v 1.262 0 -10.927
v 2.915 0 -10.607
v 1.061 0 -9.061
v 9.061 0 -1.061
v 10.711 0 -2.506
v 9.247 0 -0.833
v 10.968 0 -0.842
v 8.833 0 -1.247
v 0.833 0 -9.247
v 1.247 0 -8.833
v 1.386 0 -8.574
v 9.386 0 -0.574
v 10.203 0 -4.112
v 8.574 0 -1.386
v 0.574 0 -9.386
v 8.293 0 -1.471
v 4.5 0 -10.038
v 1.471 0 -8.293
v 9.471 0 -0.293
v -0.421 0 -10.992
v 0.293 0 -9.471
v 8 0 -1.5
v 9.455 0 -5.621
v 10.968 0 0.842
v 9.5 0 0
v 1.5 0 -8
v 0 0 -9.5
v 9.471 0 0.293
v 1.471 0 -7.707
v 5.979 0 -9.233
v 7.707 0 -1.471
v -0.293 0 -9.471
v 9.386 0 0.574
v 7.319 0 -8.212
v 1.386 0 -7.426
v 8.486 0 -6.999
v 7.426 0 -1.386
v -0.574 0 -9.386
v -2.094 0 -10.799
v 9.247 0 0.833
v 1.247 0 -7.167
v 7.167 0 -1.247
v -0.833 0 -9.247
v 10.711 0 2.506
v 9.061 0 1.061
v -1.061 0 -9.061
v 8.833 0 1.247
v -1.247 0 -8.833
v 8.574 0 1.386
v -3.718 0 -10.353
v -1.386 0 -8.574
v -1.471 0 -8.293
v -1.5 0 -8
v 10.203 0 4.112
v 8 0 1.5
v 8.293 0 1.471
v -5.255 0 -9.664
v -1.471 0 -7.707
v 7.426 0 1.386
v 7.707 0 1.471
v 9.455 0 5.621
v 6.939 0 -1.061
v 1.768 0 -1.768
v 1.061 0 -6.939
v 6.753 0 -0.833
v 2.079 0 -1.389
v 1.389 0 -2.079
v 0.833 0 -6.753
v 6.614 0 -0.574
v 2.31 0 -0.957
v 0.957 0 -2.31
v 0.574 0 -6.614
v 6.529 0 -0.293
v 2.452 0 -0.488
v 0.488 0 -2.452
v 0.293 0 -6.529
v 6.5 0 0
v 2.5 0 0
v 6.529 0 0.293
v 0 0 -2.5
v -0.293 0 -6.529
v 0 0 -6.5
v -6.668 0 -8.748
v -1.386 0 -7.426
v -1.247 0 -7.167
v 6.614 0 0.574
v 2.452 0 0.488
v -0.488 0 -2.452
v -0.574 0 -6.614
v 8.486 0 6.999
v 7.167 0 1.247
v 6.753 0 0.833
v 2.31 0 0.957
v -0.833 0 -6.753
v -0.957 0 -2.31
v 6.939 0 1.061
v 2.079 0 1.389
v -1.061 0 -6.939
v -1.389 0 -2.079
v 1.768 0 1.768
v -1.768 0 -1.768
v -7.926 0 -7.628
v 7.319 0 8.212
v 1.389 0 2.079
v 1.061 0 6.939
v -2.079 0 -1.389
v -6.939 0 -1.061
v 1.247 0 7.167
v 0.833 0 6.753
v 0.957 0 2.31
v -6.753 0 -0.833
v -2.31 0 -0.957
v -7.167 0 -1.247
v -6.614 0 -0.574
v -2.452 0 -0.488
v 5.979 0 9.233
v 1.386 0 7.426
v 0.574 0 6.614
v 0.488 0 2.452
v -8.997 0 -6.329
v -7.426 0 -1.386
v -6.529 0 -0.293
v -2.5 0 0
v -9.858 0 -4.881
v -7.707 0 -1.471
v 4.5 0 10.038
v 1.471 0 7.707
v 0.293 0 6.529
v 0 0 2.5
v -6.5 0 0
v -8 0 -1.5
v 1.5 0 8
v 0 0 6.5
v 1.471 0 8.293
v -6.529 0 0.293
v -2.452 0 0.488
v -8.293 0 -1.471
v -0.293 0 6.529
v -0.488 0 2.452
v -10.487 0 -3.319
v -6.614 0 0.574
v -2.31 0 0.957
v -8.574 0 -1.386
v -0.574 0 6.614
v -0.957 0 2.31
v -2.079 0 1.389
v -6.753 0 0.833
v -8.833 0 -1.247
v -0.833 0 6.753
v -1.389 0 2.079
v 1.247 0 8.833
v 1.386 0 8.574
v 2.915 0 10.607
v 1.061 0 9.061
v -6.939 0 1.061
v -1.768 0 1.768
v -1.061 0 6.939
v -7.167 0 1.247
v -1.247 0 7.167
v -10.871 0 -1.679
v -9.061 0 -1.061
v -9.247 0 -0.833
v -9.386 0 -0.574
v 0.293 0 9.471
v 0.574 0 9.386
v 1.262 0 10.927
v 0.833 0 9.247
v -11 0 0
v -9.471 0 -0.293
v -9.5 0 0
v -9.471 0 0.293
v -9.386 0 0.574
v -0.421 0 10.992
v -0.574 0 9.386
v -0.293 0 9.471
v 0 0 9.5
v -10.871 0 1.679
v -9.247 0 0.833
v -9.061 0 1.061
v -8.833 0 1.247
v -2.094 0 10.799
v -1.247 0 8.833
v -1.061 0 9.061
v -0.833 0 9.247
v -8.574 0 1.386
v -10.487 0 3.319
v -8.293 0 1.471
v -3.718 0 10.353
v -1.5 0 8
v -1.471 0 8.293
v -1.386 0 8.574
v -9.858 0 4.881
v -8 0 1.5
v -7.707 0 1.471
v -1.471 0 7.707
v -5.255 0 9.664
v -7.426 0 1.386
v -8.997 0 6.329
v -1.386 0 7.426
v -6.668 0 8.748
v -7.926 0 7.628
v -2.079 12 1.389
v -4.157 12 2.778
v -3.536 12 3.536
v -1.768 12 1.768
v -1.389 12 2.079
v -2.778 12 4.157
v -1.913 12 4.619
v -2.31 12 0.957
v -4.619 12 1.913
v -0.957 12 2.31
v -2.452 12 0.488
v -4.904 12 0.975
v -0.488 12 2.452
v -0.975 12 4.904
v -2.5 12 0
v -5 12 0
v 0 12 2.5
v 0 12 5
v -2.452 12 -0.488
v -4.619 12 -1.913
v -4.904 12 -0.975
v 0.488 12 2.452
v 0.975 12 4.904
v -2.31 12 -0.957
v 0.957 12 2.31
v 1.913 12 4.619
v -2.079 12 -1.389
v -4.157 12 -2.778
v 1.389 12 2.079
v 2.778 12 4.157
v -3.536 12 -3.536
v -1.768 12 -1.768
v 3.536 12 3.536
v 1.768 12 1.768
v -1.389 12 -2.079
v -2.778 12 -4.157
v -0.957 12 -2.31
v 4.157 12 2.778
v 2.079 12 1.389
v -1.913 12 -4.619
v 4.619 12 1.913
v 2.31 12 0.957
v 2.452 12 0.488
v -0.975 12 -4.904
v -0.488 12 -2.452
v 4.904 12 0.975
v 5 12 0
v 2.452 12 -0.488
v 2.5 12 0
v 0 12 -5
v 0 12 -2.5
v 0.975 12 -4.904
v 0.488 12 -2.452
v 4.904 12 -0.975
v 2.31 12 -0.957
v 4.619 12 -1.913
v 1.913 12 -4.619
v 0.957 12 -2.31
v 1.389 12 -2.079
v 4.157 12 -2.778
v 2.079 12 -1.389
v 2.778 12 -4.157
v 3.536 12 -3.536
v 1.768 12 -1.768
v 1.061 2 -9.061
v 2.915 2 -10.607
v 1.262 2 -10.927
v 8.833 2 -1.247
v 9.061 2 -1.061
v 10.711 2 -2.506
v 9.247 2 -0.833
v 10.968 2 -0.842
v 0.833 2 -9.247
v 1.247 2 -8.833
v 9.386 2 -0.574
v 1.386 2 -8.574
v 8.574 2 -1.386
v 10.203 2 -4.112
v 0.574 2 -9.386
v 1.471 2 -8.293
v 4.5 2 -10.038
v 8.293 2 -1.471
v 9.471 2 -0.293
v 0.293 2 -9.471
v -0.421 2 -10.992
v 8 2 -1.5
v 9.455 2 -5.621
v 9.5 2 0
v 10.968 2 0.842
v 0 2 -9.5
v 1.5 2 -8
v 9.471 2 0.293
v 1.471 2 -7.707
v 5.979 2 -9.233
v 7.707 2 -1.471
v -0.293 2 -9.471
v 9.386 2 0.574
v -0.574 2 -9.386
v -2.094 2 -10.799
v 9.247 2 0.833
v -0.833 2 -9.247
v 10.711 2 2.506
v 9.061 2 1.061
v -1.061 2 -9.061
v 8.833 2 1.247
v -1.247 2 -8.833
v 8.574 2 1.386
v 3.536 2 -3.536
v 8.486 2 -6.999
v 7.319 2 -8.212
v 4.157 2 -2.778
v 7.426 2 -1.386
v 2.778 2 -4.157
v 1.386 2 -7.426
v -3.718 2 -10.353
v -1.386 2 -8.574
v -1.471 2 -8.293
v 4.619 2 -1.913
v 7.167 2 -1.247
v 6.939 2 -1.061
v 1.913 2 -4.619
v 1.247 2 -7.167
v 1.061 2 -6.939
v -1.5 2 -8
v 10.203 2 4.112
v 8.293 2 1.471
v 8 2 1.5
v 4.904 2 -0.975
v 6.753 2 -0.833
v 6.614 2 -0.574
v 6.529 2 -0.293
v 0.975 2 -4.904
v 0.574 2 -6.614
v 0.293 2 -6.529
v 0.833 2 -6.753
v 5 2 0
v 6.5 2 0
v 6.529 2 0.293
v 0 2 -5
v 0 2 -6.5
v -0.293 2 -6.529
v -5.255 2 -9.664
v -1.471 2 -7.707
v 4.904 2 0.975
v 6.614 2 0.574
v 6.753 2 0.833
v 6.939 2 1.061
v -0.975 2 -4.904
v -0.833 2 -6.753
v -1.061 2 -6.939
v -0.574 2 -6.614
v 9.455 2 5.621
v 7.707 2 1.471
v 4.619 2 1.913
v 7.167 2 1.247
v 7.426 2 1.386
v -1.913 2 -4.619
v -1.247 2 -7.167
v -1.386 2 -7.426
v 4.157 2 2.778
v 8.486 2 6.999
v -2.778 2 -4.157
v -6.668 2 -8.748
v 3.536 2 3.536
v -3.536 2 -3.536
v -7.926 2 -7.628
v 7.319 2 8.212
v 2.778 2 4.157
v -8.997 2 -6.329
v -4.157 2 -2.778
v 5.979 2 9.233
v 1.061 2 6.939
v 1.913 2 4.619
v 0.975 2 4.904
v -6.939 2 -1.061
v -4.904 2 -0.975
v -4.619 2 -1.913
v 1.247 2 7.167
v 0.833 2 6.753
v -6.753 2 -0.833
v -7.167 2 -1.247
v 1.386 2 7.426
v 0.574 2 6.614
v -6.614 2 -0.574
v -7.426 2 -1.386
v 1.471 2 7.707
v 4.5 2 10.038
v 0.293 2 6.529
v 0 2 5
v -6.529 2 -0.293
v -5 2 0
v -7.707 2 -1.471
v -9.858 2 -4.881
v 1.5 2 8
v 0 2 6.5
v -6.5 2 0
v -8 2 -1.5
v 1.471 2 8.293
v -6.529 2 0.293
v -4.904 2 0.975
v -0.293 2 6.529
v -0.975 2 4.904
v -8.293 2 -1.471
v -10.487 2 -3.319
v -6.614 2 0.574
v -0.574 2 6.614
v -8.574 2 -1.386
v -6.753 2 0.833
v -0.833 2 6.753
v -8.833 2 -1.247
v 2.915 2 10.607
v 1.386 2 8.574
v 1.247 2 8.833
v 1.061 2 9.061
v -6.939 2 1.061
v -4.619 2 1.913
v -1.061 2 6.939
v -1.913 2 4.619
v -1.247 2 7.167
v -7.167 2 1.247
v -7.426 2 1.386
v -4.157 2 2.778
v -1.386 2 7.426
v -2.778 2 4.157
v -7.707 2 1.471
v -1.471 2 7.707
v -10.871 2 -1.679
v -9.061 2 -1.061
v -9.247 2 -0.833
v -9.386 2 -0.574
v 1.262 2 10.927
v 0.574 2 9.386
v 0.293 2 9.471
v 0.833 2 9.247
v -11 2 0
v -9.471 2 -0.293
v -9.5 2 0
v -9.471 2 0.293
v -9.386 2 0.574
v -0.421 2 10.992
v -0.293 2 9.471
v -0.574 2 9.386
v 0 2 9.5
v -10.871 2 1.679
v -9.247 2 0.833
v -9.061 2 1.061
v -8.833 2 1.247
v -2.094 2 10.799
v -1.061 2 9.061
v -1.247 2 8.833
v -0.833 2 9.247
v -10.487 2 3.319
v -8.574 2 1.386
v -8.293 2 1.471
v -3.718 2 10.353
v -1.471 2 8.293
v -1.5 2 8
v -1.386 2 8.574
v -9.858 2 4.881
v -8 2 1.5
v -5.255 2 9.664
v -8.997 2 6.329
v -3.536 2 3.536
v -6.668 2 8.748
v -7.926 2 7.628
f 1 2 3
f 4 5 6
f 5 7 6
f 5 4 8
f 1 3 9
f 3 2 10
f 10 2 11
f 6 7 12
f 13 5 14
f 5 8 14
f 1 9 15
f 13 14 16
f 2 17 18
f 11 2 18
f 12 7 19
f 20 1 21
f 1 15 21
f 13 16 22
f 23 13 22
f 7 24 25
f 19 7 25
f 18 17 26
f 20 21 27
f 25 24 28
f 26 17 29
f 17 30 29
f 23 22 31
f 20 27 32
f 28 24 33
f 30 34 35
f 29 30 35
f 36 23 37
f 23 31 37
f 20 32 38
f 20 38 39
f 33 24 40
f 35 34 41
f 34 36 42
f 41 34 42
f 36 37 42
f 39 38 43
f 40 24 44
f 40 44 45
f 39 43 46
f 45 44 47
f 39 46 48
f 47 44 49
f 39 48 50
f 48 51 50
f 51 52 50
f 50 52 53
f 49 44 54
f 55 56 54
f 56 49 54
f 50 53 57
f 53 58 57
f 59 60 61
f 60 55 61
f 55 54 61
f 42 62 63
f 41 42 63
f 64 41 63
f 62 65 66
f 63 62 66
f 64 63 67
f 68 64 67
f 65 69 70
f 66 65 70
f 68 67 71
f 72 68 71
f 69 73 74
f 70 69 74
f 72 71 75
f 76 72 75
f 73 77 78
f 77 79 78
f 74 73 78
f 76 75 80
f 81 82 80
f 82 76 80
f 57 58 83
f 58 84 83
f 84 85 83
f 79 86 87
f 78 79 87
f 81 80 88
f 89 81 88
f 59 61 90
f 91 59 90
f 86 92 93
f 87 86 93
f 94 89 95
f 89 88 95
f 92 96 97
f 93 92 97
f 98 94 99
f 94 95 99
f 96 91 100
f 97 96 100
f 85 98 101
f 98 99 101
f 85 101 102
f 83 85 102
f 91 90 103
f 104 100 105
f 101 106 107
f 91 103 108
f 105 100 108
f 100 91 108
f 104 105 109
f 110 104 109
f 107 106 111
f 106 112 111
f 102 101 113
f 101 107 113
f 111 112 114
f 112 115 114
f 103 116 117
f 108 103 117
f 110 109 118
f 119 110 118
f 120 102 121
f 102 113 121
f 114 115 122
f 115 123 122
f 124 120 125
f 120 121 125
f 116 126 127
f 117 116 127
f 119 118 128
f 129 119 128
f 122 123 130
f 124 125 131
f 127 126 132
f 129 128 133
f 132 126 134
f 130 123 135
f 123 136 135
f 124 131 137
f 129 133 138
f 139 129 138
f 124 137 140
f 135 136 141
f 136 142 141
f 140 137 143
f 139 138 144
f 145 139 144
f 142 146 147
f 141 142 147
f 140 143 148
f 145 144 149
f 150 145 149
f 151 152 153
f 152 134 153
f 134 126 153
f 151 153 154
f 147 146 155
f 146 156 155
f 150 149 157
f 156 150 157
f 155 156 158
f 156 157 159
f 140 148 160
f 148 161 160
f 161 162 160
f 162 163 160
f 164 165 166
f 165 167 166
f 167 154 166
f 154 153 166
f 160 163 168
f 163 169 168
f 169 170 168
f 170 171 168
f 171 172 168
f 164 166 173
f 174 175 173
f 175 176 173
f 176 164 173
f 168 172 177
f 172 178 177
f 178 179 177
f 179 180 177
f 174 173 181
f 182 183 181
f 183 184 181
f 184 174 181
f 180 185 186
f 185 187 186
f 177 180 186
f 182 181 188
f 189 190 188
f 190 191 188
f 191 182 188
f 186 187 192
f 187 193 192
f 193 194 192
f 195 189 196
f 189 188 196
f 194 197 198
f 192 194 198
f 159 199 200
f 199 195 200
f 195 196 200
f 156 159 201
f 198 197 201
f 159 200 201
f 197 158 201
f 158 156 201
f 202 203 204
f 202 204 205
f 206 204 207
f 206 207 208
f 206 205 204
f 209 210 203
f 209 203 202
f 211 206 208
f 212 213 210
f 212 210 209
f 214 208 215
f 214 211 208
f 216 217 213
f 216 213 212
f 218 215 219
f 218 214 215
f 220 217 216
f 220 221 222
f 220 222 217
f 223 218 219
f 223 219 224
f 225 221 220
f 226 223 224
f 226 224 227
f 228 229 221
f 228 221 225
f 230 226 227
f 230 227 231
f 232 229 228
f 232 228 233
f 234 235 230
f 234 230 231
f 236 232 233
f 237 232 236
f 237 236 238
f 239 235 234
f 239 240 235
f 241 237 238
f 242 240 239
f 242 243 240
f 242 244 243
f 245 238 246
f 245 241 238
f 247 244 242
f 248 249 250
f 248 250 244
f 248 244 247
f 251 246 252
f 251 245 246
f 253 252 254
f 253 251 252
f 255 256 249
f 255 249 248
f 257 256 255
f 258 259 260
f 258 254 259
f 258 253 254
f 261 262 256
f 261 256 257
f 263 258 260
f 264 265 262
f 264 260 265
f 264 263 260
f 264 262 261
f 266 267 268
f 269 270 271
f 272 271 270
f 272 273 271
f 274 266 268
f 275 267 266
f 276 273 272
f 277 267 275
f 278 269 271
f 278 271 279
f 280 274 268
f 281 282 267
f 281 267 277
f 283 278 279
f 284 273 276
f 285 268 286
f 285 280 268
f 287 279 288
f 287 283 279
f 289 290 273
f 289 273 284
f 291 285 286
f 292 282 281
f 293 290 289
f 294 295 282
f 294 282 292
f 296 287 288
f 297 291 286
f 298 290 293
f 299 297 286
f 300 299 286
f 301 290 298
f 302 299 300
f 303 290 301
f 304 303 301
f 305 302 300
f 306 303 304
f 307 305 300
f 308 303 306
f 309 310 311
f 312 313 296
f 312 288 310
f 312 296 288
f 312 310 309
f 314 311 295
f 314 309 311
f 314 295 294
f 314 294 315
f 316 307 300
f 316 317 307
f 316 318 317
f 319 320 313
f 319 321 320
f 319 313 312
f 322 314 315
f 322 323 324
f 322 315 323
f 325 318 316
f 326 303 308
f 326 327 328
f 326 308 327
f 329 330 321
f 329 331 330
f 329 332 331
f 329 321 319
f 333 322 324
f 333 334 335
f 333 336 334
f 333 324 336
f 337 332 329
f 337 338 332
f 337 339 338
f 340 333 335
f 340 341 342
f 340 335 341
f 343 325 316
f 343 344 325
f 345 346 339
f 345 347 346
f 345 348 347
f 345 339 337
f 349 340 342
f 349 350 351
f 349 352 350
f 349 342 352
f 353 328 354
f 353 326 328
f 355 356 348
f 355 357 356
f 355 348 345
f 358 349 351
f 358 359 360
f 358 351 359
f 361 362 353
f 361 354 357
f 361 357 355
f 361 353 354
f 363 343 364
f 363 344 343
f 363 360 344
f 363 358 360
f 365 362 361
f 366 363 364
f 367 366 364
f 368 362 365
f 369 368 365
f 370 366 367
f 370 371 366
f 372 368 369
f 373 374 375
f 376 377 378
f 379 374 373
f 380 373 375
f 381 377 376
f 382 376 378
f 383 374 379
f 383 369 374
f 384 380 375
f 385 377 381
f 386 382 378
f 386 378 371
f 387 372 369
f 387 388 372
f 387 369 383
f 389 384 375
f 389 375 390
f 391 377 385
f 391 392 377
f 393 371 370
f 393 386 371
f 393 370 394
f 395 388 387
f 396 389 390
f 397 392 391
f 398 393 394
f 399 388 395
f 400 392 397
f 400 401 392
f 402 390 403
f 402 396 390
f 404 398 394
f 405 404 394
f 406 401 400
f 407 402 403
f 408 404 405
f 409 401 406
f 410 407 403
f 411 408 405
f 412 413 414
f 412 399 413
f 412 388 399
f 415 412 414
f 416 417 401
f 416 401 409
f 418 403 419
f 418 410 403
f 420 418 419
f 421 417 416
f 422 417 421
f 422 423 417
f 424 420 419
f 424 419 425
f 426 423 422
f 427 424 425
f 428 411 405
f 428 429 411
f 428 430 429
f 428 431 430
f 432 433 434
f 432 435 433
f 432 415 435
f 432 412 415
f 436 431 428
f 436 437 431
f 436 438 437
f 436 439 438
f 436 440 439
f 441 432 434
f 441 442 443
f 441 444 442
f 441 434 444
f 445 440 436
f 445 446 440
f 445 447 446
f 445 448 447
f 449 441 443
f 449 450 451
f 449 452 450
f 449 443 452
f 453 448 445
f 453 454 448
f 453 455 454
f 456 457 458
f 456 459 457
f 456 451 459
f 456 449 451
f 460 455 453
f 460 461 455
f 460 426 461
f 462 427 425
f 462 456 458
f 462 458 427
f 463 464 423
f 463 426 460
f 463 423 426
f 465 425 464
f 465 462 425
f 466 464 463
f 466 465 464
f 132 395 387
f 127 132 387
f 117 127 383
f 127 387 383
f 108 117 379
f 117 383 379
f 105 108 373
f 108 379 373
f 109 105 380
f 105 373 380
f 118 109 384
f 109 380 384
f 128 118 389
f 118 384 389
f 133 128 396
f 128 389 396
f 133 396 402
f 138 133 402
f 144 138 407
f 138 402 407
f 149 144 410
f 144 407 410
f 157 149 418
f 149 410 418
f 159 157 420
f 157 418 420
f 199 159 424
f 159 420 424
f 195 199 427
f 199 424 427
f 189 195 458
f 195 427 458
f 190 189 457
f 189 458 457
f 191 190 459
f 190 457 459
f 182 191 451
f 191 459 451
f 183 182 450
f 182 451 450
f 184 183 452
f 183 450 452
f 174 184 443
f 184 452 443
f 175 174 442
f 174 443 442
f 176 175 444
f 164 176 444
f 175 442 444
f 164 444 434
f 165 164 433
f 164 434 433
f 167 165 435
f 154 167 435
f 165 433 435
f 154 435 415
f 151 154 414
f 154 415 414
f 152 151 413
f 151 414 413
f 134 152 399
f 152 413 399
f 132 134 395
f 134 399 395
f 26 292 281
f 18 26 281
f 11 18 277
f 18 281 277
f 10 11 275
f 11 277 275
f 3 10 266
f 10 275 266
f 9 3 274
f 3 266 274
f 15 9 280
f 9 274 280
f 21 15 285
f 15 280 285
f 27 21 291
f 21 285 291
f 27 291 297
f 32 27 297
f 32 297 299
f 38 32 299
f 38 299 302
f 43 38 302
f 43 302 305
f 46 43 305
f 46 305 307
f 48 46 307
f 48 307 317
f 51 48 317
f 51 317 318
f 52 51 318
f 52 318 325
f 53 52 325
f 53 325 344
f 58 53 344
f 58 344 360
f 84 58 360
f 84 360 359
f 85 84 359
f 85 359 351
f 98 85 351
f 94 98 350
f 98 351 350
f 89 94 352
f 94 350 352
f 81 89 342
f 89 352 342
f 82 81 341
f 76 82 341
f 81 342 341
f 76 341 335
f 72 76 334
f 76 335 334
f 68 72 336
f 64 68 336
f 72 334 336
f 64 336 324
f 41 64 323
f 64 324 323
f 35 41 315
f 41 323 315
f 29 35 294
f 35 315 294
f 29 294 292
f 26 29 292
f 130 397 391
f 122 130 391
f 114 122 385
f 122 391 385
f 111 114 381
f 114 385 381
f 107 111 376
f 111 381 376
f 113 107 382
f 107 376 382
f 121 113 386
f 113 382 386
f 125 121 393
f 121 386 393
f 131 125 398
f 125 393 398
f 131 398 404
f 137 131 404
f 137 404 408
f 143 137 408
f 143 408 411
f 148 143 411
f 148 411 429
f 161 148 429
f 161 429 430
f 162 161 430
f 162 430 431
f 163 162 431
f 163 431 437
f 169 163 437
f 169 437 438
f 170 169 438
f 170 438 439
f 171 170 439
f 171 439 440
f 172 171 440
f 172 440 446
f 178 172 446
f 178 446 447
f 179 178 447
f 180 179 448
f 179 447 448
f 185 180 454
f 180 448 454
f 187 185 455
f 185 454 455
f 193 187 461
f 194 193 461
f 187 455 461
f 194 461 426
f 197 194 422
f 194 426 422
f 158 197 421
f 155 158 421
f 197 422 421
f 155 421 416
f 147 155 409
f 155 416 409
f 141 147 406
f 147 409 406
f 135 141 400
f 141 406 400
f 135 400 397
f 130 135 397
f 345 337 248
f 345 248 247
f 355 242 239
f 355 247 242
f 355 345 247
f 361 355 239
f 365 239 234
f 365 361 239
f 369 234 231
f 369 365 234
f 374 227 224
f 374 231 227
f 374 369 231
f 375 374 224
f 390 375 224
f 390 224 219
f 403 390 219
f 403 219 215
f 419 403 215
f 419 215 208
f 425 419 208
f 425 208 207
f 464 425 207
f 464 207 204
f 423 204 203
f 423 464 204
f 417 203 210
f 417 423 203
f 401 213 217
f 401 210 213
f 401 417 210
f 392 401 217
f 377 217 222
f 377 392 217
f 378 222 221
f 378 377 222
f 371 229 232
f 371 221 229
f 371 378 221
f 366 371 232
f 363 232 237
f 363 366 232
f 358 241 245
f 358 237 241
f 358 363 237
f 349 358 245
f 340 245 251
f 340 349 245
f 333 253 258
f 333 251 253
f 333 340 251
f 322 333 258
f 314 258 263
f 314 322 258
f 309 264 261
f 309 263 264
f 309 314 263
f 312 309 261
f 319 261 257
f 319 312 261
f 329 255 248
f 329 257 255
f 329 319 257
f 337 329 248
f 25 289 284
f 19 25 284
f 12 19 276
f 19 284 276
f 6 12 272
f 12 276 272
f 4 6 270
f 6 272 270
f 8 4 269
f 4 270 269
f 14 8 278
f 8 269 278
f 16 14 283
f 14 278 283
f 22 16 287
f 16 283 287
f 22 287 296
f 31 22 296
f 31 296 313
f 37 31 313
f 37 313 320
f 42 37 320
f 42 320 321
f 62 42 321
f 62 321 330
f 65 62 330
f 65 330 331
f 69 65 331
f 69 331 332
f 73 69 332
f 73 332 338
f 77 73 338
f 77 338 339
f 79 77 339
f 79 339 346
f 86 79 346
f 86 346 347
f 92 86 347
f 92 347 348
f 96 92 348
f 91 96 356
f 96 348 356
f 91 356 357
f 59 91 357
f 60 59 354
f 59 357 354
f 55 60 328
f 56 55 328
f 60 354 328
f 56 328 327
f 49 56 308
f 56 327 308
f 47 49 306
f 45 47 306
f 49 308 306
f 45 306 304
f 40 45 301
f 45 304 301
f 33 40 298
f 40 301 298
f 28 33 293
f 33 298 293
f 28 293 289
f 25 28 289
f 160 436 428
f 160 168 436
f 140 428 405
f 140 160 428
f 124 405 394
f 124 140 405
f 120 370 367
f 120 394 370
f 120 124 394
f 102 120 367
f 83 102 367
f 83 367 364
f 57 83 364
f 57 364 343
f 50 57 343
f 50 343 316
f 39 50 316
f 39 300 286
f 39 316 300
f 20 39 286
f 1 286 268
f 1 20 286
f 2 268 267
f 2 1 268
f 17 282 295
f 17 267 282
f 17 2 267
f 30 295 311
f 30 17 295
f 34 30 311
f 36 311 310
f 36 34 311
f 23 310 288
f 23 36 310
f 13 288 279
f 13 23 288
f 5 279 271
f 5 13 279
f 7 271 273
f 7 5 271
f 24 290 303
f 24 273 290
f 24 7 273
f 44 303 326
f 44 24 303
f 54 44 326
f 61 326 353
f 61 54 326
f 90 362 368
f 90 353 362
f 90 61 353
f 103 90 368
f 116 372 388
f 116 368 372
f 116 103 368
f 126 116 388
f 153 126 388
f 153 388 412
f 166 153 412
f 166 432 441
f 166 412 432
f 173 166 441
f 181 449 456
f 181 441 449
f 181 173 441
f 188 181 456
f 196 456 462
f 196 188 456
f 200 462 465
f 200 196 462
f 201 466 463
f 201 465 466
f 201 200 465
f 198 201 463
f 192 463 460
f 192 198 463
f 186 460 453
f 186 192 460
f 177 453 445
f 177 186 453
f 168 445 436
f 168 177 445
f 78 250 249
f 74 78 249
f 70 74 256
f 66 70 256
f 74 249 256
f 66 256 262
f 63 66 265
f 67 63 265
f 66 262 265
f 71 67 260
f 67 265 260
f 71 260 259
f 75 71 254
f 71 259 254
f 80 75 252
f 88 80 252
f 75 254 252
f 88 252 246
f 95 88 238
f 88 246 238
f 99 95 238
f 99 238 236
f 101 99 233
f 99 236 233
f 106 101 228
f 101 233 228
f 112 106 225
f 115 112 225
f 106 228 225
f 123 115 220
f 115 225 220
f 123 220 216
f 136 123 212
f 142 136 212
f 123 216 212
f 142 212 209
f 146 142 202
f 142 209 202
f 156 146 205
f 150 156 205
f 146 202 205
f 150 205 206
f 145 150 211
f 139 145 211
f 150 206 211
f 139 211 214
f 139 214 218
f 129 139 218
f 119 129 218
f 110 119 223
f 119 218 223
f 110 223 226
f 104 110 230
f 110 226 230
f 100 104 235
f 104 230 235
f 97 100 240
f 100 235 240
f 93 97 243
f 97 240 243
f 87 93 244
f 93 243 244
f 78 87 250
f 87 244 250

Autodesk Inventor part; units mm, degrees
ref_plane "YZ Plane" through (0, 0, 0) normal (1, 0, 0) x (0, 1, 0)
ref_plane "XZ Plane" through (0, 0, 0) normal (0, 1, 0) x (-1, 0, 0)
ref_plane "XY Plane" through (0, 0, 0) normal (0, 0, 1) x (1, 0, 0)
sketch "Эскиз1" plane through (0, 0, 0) normal (0, 1, 0) x (-1, 0, 0)
  circle A0 centre (0, 0) radius 11
  dimension "d0" = 22
extrude "Выдавливание1" add sketch "Эскиз1" along normal blind 2
sketch "Эскиз2" plane through (0, 2, 0) normal (0, 1, 0) x (1, 0, 0)
  circle A0 centre (0, 0) radius 5
  dimension "d3" = 10
extrude "Выдавливание2" add sketch "Эскиз2" along normal blind 10
sketch "Эскиз3" plane through (0, 12, 0) normal (0, 1, 0) x (1, 0, 0)
  circle A0 centre (0, 0) radius 2.5
  dimension "d6" = 5
extrude "Выдавливание3" cut sketch "Эскиз3" against normal blind 12
sketch "Эскиз4" plane through (0, 2, 0) normal (0, 1, 0) x (1, 0, 0)
  circle A0 centre (0, 0) radius 8 construction
  circle A1 centre (-8, 0) radius 1.5
  circle A2 centre (0, -8) radius 1.5
  circle A3 centre (8, 0) radius 1.5
  circle A4 centre (0, 8) radius 1.5
  dimension "d9" = 16
  dimension "d10" = 3
  dimension "d13" = 360
extrude "Выдавливание4" cut sketch "Эскиз4" against normal blind 2
properties part number "муфта"
